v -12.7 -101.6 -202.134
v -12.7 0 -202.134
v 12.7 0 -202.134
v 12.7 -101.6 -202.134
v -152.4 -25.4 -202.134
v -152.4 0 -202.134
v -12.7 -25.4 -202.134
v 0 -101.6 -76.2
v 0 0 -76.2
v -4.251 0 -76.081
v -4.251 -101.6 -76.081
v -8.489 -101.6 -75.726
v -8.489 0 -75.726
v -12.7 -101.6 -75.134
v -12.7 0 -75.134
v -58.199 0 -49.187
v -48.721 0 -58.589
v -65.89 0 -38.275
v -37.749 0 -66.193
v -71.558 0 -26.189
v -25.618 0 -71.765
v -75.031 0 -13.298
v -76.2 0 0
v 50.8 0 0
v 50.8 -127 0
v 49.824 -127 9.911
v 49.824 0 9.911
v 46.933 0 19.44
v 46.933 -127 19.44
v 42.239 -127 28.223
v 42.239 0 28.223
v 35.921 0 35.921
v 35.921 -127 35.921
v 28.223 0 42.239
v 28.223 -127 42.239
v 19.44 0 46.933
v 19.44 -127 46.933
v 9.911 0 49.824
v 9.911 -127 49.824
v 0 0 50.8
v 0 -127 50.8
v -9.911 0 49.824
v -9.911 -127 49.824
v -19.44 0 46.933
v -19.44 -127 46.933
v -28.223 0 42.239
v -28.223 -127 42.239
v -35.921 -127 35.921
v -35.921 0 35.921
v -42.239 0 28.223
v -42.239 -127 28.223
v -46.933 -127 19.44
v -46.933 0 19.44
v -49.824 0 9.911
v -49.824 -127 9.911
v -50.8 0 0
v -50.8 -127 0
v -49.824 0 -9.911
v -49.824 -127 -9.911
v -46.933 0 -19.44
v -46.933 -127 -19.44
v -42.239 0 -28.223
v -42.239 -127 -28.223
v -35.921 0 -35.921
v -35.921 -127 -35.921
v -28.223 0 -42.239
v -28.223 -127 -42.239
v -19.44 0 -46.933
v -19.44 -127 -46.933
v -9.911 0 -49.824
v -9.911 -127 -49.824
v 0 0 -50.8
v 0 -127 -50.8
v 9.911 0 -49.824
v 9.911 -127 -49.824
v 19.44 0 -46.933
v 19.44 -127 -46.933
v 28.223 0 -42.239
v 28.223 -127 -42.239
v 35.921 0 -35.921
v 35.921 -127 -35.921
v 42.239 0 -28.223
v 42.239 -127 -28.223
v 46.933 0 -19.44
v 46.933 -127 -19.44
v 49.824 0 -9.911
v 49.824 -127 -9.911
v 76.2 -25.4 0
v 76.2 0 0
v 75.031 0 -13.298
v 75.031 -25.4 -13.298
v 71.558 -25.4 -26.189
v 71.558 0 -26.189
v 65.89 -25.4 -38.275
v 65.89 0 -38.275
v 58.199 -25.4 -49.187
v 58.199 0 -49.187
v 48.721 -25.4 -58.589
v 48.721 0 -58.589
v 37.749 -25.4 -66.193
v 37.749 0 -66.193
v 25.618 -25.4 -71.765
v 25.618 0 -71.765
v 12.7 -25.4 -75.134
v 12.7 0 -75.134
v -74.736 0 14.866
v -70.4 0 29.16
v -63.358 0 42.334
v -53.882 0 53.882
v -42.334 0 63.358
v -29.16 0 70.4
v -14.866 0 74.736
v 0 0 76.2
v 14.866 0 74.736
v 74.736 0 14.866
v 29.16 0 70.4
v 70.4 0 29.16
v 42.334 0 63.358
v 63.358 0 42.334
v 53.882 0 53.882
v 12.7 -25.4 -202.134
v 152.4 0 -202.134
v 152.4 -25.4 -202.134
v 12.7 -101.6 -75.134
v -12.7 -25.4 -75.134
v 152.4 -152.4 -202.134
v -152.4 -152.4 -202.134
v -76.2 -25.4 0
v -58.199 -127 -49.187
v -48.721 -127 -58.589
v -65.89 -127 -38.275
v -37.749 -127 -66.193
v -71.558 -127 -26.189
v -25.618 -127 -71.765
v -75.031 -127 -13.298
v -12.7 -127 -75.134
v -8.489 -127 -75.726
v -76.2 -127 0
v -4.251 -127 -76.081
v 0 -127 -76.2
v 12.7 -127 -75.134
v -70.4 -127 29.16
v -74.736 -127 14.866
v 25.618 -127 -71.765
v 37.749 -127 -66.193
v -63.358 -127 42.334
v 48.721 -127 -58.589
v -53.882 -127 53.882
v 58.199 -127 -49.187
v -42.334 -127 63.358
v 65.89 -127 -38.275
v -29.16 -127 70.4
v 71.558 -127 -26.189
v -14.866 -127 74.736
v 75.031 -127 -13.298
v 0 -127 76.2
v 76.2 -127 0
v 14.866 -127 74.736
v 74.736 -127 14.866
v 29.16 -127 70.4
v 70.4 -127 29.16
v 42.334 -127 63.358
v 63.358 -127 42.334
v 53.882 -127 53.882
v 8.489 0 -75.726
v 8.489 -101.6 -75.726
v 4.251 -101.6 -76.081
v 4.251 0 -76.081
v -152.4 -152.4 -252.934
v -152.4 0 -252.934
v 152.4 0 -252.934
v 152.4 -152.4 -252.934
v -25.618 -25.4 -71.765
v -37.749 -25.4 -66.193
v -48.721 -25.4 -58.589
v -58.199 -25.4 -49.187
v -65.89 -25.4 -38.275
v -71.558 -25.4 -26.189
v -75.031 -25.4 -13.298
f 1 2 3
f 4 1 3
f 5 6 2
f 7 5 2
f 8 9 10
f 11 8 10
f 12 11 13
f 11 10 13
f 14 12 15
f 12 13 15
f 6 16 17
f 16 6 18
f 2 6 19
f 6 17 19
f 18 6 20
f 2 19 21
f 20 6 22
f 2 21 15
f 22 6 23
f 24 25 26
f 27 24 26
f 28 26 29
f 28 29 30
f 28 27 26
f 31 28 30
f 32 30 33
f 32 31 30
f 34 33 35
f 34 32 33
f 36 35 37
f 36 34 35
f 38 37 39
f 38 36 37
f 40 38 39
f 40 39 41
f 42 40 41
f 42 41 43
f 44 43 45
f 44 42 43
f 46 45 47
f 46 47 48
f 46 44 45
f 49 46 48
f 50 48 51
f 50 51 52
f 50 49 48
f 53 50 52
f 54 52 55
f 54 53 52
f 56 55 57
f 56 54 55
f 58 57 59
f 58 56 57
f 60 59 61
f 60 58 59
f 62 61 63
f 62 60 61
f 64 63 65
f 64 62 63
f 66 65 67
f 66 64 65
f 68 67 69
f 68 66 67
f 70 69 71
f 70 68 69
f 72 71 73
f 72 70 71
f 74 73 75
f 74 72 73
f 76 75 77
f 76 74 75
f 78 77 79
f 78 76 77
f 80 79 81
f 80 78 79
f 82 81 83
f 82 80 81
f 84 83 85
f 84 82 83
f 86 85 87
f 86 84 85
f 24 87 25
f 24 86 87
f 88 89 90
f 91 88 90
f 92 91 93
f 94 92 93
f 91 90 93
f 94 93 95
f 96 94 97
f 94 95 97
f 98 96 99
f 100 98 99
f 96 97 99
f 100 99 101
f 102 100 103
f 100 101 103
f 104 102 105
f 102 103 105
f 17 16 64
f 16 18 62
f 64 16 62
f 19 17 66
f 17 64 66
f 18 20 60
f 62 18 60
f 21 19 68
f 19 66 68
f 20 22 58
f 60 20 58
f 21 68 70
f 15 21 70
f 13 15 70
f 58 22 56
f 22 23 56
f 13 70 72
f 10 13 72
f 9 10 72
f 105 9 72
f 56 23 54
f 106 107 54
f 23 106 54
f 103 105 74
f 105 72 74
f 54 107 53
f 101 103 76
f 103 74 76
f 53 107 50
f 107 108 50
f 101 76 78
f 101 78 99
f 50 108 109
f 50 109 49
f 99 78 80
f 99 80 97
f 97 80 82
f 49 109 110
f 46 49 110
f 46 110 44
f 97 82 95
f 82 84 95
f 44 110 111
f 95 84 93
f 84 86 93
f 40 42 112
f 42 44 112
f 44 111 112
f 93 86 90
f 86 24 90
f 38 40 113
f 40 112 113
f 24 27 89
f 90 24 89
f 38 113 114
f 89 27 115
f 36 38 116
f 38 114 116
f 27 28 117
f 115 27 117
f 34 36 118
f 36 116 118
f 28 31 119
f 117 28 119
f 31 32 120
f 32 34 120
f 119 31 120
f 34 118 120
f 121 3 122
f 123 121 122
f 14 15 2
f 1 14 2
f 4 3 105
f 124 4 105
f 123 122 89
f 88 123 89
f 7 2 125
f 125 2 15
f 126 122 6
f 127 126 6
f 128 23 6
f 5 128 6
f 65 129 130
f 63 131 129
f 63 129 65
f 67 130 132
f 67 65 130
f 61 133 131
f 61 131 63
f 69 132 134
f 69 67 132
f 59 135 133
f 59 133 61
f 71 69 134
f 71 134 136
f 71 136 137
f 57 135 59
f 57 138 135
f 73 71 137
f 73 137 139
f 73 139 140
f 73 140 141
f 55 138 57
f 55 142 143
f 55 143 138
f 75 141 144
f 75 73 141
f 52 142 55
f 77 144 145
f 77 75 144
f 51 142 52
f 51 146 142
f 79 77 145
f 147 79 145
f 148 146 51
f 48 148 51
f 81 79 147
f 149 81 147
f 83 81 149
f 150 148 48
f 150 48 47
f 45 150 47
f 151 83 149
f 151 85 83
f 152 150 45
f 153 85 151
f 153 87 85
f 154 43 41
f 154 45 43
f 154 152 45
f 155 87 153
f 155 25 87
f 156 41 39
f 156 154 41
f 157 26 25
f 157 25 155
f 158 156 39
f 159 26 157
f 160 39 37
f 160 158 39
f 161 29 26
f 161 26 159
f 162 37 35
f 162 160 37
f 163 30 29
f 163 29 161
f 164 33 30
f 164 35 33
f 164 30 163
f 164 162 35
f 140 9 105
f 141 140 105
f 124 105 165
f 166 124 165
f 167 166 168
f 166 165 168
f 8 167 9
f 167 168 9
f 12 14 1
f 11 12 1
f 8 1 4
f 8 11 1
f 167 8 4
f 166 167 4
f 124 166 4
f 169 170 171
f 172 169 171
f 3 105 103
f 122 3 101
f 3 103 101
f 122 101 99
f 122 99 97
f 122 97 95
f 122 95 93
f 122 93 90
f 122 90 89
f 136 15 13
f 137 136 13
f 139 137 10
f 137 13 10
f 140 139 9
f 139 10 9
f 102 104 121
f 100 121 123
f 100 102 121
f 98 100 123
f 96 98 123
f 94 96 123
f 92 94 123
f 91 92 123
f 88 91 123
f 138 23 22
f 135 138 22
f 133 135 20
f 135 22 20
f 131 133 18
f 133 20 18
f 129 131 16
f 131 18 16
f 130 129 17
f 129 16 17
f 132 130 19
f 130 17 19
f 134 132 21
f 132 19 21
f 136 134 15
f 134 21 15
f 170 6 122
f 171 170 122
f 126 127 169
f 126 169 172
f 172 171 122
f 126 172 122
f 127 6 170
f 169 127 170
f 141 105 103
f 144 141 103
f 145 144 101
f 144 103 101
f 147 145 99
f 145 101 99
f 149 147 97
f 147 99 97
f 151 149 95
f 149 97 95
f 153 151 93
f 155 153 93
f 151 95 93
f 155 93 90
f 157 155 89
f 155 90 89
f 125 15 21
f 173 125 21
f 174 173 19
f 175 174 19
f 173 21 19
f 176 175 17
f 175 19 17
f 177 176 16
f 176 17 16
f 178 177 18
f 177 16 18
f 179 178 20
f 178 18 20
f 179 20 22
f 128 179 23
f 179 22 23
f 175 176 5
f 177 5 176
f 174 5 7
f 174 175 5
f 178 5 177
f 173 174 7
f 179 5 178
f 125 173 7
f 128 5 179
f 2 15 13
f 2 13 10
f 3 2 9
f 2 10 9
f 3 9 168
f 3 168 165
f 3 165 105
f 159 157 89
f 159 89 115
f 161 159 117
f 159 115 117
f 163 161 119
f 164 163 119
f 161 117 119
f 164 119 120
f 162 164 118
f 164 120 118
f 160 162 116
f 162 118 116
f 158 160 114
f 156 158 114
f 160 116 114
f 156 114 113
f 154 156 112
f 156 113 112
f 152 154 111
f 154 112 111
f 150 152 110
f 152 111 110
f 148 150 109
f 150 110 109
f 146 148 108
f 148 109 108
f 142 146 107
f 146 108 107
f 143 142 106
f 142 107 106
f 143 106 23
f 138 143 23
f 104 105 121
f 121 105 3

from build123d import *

# Parameters (mm, degrees)
F1_DEPTH = 152.4
F0_R     = 50.8
F2_DEPTH = 127
F3_DEPTH = 101.6
F4_DEPTH = 25.4
F5_DEPTH = 25.4


with BuildPart() as f1:
    # F0 (on Front) → F1 (new body)
    with BuildSketch(Plane.XZ):
        Polygon((152.4, -252.934213), (152.4, -202.134213), (12.7, -202.134213), (-12.7, -202.134213), (-152.4, -202.134213), (-152.4, -252.934213), align=None)
    extrude(amount=F1_DEPTH)


with BuildPart() as f2:
    # F0 (on Front) → F2 (new body)
    with BuildSketch(Plane.XZ):
        with BuildLine():
            ThreePointArc((12.7, -75.134213), (58.198711, -49.186888), (76.2, 0))
            ThreePointArc((76.2, 0), (0, 76.2), (-76.2, 0))
            ThreePointArc((-76.2, 0), (-58.198711, -49.186888), (-12.7, -75.134213))
            ThreePointArc((-12.7, -75.134213), (-6.372321, -75.933086), (0, -76.2))
            Line((0, -76.2), (12.7, -75.134213))
        make_face()
        Circle(F0_R, mode=Mode.SUBTRACT)
    extrude(amount=F2_DEPTH)


with BuildPart() as f3:
    # F0 (on Front) → F3 (new body)
    with BuildSketch(Plane.XZ):
        with BuildLine():
            Line((12.7, -202.134213), (12.7, -75.134213))
            ThreePointArc((12.7, -75.134213), (6.372321, -75.933086), (0, -76.2))
            ThreePointArc((0, -76.2), (-6.372321, -75.933086), (-12.7, -75.134213))
            Line((-12.7, -75.134213), (-12.7, -202.134213))
            Line((-12.7, -202.134213), (12.7, -202.134213))
        make_face()
    extrude(amount=F3_DEPTH)


with BuildPart() as f4:
    # F0 (on Front) → F4 (new body)
    with BuildSketch(Plane.XZ):
        with BuildLine():
            ThreePointArc((-12.7, -75.134213), (-58.198711, -49.186888), (-76.2, 0))
            Line((-76.2, 0), (-152.4, -202.134213))
            Line((-152.4, -202.134213), (-12.7, -202.134213))
            Line((-12.7, -202.134213), (-12.7, -75.134213))
        make_face()
    extrude(amount=F4_DEPTH)


with BuildPart() as f5:
    # F0 (on Front) → F5 (new body)
    with BuildSketch(Plane.XZ):
        with BuildLine():
            Line((152.4, -202.134213), (76.2, 0))
            ThreePointArc((76.2, 0), (58.198711, -49.186888), (12.7, -75.134213))
            Line((12.7, -75.134213), (12.7, -202.134213))
            Line((12.7, -202.134213), (152.4, -202.134213))
        make_face()
    extrude(amount=F5_DEPTH)


solid = Compound([f1.part, f2.part, f3.part, f4.part, f5.part])
